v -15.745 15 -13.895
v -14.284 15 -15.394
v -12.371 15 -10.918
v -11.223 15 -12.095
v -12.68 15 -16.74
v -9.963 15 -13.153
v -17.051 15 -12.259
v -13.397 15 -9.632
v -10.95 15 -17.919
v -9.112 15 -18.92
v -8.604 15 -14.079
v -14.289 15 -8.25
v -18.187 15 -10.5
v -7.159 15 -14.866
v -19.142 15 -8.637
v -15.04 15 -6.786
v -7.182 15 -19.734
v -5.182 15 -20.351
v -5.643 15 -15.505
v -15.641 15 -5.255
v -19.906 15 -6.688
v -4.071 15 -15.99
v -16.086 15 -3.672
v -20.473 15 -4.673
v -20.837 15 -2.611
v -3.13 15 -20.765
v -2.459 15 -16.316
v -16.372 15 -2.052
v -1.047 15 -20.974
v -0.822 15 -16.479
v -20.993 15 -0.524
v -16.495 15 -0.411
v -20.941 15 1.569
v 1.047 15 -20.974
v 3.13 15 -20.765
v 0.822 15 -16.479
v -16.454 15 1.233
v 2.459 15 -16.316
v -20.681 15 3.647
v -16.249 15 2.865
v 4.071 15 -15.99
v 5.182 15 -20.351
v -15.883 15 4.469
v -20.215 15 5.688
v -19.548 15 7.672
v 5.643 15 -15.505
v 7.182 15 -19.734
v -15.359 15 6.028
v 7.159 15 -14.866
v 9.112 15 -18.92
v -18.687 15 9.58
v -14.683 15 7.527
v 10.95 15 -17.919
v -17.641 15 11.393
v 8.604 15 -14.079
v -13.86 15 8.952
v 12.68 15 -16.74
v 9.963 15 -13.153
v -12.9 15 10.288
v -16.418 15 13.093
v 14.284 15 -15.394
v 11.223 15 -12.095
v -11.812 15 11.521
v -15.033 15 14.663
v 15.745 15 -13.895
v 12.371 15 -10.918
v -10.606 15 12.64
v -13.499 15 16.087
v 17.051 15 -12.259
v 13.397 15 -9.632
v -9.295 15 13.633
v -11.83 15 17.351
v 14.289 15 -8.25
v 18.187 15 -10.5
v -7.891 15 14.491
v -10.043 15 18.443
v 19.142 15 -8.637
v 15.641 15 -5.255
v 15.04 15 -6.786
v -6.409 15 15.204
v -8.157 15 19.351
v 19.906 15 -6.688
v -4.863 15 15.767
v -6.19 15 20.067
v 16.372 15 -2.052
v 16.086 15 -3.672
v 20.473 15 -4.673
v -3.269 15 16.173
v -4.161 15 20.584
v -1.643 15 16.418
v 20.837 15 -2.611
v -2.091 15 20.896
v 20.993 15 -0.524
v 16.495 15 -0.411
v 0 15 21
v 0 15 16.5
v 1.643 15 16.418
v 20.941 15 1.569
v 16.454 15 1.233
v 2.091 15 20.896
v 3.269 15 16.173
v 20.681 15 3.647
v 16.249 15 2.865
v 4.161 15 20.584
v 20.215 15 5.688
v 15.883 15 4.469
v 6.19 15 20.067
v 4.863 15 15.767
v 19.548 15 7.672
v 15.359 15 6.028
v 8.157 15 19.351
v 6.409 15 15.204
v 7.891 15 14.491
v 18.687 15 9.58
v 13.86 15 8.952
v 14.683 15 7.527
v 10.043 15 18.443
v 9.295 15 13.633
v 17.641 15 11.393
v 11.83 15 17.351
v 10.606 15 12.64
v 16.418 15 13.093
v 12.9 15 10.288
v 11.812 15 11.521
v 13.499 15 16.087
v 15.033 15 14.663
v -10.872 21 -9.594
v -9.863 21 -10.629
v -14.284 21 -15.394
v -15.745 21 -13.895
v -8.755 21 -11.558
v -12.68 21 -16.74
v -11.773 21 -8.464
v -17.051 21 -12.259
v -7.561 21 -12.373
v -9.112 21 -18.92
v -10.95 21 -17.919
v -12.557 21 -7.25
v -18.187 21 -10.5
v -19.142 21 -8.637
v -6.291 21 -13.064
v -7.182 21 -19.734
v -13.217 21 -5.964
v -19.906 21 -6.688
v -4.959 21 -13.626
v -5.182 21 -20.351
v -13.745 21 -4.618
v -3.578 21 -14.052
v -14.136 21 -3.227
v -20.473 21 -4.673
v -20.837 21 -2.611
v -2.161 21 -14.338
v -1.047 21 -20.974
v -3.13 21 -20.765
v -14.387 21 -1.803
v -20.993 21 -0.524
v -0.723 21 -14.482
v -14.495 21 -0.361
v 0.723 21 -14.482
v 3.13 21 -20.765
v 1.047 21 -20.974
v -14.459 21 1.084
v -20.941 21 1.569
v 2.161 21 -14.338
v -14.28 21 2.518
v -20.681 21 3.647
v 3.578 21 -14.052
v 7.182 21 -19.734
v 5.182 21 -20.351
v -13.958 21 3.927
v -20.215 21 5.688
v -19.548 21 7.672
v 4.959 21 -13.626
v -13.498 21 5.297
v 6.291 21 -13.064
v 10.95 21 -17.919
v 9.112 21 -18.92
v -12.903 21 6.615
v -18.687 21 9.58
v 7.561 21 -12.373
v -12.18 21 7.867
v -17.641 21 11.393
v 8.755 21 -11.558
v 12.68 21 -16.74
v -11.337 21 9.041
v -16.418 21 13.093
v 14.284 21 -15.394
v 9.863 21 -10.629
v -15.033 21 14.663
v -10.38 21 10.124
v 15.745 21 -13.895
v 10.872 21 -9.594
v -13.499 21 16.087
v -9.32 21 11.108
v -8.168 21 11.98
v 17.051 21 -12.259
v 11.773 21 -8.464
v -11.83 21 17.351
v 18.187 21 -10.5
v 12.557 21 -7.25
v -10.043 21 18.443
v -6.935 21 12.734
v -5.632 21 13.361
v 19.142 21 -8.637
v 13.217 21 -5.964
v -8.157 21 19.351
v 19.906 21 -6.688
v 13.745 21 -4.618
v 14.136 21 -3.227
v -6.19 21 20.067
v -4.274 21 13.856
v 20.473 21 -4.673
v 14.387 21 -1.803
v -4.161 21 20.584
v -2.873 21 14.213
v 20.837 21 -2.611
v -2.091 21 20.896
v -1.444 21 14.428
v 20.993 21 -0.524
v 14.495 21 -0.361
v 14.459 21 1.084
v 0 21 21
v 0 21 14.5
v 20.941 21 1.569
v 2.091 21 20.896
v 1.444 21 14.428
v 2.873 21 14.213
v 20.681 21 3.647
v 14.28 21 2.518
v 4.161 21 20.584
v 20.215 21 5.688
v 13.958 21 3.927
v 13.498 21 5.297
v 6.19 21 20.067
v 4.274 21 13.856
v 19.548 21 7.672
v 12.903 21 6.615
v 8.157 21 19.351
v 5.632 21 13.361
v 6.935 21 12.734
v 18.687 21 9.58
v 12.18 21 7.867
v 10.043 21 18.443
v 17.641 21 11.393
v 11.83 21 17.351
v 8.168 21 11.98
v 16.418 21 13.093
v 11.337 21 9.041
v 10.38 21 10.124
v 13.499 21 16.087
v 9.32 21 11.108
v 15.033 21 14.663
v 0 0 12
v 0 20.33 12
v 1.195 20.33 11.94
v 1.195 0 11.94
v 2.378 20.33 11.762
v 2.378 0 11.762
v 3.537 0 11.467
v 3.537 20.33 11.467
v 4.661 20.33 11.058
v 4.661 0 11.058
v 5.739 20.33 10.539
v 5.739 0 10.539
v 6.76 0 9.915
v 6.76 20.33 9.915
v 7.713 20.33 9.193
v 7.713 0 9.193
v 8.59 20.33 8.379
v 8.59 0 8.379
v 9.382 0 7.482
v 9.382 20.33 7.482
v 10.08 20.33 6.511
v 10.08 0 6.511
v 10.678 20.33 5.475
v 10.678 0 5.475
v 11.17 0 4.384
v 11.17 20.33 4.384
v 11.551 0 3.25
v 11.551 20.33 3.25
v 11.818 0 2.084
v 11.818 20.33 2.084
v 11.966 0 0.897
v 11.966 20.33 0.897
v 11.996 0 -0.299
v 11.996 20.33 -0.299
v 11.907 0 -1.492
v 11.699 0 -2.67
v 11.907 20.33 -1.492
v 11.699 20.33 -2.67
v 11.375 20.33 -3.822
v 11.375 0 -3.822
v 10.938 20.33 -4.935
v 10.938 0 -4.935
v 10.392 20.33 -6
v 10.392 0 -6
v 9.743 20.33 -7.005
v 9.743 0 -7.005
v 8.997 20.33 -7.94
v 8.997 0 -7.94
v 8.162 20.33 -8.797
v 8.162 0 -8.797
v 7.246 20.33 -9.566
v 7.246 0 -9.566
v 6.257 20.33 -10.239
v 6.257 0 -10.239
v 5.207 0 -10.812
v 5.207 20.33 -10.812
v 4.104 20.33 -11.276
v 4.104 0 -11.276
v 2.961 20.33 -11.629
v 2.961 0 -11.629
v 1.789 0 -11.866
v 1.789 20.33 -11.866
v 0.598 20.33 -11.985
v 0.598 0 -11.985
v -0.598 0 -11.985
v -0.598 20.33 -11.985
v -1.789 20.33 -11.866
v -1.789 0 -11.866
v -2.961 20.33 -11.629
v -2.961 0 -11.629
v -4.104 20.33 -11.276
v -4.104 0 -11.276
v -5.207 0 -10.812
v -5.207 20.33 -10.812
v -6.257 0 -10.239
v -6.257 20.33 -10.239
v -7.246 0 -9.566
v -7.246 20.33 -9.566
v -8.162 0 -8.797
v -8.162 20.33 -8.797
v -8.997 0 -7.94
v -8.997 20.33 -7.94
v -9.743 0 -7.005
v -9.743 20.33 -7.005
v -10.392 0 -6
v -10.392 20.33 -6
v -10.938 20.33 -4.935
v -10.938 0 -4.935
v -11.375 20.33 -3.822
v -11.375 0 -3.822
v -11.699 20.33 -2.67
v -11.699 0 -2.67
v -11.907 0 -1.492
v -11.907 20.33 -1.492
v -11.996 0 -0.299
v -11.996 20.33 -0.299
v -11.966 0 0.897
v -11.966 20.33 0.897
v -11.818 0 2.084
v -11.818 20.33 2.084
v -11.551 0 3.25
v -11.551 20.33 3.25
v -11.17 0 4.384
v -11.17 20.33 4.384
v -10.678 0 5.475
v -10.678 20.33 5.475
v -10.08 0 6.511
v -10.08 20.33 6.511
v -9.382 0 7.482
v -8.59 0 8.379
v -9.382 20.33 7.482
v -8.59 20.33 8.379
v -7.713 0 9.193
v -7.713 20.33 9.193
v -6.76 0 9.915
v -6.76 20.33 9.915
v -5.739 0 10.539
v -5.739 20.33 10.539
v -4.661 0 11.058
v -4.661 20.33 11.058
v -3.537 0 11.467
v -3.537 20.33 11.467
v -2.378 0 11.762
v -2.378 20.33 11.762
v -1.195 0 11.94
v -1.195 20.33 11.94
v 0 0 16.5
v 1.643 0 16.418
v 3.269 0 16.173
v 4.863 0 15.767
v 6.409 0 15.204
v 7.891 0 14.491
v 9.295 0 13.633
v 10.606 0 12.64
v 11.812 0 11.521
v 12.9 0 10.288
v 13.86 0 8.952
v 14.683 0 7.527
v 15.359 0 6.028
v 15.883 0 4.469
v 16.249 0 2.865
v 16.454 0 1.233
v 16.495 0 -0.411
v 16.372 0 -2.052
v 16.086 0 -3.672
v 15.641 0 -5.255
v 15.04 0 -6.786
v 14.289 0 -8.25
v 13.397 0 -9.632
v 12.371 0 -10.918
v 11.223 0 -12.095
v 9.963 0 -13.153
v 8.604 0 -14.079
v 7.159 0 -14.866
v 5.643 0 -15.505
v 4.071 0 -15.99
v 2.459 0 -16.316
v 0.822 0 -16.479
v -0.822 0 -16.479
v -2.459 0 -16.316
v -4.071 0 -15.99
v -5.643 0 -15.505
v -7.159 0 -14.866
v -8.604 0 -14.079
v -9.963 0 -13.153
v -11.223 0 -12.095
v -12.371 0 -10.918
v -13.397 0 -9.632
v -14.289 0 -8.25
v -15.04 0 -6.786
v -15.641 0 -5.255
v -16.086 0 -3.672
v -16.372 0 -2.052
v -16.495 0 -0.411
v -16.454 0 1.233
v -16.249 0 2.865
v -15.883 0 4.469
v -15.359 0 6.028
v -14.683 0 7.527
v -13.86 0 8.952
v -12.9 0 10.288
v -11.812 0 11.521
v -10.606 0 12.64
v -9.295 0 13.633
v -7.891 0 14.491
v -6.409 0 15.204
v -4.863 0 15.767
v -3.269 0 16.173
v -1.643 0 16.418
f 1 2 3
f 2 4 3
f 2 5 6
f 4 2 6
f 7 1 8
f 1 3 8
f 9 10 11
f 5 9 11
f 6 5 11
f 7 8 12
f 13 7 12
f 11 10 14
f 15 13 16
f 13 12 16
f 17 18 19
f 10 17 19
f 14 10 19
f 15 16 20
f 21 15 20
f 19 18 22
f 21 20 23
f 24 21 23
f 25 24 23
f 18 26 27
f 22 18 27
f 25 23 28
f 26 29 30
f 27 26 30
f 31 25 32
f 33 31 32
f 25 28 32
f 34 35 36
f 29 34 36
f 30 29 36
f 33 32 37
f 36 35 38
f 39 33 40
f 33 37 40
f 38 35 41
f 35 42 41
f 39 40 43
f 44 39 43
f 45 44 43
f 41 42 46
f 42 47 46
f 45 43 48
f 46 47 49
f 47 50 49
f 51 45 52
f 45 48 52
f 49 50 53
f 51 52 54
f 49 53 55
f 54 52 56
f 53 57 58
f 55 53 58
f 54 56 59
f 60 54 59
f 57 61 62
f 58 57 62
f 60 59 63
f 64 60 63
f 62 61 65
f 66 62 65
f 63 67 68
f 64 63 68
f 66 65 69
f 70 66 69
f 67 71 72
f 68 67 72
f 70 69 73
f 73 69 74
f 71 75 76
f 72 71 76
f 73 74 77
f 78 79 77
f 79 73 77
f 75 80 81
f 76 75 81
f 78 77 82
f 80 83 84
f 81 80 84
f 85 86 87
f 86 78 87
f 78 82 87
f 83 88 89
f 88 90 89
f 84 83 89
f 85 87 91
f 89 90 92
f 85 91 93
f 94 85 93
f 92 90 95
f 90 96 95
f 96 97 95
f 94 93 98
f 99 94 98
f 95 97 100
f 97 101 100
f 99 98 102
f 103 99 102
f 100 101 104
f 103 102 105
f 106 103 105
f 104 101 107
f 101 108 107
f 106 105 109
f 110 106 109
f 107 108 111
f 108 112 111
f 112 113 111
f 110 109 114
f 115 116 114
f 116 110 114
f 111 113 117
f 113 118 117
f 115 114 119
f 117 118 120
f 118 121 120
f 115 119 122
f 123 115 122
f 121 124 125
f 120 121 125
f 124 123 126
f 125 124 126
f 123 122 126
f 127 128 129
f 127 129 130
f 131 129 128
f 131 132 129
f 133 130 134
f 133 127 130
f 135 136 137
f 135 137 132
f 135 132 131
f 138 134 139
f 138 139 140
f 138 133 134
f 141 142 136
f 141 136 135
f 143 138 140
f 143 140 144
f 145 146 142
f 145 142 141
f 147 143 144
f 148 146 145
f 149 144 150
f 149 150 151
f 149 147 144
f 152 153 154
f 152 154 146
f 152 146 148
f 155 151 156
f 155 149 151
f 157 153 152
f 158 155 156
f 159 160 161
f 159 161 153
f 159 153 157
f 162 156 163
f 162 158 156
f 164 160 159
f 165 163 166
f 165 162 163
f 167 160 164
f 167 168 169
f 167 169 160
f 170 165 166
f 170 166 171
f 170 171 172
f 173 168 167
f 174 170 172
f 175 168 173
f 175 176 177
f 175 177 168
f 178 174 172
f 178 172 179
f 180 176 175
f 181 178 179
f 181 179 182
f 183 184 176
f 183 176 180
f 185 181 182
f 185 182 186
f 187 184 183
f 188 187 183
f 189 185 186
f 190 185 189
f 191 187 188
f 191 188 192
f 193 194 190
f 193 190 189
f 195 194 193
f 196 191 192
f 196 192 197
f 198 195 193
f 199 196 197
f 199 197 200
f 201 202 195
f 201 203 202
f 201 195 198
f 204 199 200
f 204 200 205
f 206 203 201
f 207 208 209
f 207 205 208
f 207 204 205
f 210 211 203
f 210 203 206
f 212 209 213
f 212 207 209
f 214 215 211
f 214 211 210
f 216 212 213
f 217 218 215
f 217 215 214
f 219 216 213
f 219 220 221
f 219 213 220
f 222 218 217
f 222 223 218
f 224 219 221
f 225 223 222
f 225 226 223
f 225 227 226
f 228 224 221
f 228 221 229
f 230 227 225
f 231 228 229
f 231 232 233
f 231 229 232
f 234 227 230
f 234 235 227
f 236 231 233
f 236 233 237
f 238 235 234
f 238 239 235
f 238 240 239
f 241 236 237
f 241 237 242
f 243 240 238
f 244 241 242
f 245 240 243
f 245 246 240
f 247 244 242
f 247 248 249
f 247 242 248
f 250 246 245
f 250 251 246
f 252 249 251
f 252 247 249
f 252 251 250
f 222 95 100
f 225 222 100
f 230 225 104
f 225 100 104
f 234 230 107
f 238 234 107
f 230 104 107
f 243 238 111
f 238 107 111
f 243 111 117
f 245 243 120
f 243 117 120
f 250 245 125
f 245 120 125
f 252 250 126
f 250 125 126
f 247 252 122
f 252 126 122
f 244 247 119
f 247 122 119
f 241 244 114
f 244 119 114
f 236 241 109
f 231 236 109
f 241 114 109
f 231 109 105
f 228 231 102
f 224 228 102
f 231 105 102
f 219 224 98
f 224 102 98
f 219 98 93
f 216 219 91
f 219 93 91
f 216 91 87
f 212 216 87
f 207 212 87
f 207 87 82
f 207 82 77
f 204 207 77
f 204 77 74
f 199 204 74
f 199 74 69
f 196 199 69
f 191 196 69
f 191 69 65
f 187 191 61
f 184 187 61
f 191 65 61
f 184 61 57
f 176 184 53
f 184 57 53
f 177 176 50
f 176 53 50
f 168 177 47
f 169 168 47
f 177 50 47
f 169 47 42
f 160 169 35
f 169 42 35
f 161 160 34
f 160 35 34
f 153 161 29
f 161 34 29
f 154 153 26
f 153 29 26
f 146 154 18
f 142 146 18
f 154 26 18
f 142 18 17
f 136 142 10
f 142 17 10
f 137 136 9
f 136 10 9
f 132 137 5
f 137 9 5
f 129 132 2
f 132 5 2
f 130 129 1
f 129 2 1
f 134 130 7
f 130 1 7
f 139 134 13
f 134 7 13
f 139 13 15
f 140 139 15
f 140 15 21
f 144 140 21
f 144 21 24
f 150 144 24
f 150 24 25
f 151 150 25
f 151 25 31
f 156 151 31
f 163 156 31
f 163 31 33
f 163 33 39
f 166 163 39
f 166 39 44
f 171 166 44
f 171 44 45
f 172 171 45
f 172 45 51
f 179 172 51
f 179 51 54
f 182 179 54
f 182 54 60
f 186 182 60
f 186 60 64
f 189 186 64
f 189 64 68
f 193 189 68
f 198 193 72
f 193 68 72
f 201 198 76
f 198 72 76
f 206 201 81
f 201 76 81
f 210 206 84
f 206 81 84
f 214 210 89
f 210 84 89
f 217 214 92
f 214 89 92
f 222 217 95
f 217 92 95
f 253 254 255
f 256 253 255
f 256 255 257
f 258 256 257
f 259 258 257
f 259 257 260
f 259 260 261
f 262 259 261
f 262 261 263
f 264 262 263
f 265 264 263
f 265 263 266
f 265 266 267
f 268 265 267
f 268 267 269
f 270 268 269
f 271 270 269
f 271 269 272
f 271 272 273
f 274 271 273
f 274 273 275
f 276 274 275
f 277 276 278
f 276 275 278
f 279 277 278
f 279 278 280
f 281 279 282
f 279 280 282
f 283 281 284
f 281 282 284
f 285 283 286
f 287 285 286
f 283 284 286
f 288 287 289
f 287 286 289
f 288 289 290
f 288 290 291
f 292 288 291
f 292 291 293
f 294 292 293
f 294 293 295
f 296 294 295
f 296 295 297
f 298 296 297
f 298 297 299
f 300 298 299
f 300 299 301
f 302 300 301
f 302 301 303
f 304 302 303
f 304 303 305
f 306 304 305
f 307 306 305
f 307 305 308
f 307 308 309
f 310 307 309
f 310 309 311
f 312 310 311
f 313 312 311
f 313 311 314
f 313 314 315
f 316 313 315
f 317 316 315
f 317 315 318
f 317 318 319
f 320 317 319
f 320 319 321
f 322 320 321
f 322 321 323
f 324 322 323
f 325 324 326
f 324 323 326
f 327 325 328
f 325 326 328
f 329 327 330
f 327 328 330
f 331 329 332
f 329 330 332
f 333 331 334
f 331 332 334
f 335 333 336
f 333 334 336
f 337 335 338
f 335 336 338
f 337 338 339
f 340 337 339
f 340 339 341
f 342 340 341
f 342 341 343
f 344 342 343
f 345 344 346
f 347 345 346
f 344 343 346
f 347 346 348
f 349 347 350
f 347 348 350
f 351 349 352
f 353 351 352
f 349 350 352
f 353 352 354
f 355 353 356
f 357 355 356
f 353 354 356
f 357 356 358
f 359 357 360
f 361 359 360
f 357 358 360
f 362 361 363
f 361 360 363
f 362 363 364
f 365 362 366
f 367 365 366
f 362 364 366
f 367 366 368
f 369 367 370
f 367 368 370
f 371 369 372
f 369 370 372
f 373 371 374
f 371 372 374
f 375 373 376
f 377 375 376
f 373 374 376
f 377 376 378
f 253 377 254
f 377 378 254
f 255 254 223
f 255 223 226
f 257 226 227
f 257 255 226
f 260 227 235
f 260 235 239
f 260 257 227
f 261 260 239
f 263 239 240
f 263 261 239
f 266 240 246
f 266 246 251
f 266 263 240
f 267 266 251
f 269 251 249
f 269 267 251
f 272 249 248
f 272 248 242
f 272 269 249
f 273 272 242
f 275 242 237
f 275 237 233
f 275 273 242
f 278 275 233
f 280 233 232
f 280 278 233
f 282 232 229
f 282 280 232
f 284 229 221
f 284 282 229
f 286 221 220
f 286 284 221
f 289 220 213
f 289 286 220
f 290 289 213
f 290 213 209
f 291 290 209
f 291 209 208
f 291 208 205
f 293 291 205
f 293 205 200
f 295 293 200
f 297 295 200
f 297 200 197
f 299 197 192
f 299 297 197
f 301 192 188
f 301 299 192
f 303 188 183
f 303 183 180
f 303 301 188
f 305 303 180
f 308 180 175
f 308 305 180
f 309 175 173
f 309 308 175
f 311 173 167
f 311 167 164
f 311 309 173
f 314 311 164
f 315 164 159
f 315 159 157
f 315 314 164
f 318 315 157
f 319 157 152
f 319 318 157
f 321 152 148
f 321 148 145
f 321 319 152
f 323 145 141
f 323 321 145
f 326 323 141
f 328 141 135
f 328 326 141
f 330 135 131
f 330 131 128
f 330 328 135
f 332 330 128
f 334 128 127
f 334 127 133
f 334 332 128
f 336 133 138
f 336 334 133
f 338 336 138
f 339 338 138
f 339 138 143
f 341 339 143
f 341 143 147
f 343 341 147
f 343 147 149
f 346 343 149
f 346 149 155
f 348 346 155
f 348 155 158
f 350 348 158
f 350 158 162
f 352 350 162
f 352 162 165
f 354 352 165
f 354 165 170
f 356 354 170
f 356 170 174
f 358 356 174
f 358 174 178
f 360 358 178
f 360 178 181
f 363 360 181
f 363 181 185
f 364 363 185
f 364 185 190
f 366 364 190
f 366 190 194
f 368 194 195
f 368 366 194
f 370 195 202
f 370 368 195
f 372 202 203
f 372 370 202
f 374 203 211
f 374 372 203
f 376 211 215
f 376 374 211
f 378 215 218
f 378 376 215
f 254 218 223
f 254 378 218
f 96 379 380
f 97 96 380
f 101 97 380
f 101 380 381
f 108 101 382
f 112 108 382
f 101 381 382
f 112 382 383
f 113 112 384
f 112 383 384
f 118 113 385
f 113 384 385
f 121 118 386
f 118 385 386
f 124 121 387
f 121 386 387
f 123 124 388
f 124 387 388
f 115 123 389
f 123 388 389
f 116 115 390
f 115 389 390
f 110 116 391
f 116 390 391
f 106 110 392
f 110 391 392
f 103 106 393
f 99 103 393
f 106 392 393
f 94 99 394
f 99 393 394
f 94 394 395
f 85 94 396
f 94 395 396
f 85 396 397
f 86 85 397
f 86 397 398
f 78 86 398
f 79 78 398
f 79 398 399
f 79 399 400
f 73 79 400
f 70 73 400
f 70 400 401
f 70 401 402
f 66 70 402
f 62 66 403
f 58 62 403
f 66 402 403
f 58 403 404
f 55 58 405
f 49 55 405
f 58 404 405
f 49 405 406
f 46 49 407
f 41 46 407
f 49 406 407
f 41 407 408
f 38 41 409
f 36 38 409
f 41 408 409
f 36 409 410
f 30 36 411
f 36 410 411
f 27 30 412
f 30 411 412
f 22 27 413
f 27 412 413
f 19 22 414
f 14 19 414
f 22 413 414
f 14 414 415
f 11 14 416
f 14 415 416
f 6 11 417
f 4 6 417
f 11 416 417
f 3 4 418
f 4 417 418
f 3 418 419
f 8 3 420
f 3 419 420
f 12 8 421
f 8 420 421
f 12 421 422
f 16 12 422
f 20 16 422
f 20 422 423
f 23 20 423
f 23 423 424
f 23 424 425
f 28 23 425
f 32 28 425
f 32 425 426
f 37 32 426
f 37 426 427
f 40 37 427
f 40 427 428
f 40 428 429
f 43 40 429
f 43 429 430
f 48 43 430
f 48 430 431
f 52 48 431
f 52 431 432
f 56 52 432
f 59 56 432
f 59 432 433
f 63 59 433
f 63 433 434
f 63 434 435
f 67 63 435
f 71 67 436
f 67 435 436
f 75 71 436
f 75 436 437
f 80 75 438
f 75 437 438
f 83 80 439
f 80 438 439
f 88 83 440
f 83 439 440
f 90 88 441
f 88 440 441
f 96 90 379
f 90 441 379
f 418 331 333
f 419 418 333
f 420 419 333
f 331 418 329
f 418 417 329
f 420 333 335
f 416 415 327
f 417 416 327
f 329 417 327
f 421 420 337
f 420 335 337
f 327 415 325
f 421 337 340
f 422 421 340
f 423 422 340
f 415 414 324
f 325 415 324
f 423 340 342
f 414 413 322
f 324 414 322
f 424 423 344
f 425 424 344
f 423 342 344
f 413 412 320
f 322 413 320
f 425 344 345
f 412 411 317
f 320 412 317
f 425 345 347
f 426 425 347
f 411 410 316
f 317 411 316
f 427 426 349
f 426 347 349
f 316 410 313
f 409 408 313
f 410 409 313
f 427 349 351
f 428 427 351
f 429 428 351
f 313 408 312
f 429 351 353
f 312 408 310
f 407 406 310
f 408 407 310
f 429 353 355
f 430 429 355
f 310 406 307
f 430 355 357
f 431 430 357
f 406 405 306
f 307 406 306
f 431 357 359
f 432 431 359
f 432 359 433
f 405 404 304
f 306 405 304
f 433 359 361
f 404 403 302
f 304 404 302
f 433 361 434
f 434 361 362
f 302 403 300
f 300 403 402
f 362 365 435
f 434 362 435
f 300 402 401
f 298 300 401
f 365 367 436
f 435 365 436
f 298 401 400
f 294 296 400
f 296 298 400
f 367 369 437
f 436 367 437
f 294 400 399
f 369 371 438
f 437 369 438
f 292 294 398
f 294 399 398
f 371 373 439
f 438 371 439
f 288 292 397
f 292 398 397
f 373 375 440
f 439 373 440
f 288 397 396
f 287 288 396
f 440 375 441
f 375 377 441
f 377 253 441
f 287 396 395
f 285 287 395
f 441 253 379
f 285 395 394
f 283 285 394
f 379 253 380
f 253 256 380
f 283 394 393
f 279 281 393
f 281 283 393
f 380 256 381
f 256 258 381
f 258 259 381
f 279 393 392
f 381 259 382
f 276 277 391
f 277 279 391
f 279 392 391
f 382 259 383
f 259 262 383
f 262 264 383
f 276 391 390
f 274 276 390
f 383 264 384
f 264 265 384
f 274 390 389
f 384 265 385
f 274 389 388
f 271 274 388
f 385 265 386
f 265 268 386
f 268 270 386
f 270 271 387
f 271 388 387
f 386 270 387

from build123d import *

# Parameters (mm, degrees)
SKETCH1_R           = 16.5
BOSS_EXTRUDE1_DEPTH = 15
SKETCH2_R           = 21
BOSS_EXTRUDE2_DEPTH = 6
SKETCH3_R           = 12
CUT_EXTRUDE1_DEPTH  = 37.373066959
CHAMFER1_SIZE       = 2.5
CHAMFER1_SIZE2      = 0.669872981


with BuildPart() as part:
    # Sketch1 → Boss-Extrude1 (new body)
    with BuildSketch(Plane(origin=(0, 0, 0), x_dir=(1, 0, 0), z_dir=(0, 1, 0))):
        with Locations(Location((0, 0, 0), (0, 0, 270))):
            Circle(SKETCH1_R)
    extrude(amount=BOSS_EXTRUDE1_DEPTH)

    # Sketch2 → Boss-Extrude2 (add)
    with BuildSketch(Plane(origin=(0, 15, 0), x_dir=(1, 0, 0), z_dir=(0, 1, 0))):
        with Locations(Location((0, 0, 0), (0, 0, 270))):
            Circle(SKETCH2_R)
    extrude(amount=BOSS_EXTRUDE2_DEPTH)

    # Sketch3 → Cut-Extrude1 (cut, through all)
    with BuildSketch(Plane(origin=(0, 21, 0), x_dir=(1, 0, 0), z_dir=(0, 1, 0))):
        with Locations(Location((0, 0, 0), (0, 0, 270))):
            Circle(SKETCH3_R)
    extrude(amount=-CUT_EXTRUDE1_DEPTH, mode=Mode.SUBTRACT)

    # Chamfer1
    chamfer1_edges = [part.edges().sort_by_distance(p)[0] for p in [
        (0, 21, -12),
    ]]
    chamfer1_side = [part.faces().sort_by_distance(p)[0] for p in [
        (0, 21, -20.406030304),
    ]]
    chamfer(chamfer1_edges, length=CHAMFER1_SIZE, length2=CHAMFER1_SIZE2, reference=chamfer1_side[0])


solid = part.part
